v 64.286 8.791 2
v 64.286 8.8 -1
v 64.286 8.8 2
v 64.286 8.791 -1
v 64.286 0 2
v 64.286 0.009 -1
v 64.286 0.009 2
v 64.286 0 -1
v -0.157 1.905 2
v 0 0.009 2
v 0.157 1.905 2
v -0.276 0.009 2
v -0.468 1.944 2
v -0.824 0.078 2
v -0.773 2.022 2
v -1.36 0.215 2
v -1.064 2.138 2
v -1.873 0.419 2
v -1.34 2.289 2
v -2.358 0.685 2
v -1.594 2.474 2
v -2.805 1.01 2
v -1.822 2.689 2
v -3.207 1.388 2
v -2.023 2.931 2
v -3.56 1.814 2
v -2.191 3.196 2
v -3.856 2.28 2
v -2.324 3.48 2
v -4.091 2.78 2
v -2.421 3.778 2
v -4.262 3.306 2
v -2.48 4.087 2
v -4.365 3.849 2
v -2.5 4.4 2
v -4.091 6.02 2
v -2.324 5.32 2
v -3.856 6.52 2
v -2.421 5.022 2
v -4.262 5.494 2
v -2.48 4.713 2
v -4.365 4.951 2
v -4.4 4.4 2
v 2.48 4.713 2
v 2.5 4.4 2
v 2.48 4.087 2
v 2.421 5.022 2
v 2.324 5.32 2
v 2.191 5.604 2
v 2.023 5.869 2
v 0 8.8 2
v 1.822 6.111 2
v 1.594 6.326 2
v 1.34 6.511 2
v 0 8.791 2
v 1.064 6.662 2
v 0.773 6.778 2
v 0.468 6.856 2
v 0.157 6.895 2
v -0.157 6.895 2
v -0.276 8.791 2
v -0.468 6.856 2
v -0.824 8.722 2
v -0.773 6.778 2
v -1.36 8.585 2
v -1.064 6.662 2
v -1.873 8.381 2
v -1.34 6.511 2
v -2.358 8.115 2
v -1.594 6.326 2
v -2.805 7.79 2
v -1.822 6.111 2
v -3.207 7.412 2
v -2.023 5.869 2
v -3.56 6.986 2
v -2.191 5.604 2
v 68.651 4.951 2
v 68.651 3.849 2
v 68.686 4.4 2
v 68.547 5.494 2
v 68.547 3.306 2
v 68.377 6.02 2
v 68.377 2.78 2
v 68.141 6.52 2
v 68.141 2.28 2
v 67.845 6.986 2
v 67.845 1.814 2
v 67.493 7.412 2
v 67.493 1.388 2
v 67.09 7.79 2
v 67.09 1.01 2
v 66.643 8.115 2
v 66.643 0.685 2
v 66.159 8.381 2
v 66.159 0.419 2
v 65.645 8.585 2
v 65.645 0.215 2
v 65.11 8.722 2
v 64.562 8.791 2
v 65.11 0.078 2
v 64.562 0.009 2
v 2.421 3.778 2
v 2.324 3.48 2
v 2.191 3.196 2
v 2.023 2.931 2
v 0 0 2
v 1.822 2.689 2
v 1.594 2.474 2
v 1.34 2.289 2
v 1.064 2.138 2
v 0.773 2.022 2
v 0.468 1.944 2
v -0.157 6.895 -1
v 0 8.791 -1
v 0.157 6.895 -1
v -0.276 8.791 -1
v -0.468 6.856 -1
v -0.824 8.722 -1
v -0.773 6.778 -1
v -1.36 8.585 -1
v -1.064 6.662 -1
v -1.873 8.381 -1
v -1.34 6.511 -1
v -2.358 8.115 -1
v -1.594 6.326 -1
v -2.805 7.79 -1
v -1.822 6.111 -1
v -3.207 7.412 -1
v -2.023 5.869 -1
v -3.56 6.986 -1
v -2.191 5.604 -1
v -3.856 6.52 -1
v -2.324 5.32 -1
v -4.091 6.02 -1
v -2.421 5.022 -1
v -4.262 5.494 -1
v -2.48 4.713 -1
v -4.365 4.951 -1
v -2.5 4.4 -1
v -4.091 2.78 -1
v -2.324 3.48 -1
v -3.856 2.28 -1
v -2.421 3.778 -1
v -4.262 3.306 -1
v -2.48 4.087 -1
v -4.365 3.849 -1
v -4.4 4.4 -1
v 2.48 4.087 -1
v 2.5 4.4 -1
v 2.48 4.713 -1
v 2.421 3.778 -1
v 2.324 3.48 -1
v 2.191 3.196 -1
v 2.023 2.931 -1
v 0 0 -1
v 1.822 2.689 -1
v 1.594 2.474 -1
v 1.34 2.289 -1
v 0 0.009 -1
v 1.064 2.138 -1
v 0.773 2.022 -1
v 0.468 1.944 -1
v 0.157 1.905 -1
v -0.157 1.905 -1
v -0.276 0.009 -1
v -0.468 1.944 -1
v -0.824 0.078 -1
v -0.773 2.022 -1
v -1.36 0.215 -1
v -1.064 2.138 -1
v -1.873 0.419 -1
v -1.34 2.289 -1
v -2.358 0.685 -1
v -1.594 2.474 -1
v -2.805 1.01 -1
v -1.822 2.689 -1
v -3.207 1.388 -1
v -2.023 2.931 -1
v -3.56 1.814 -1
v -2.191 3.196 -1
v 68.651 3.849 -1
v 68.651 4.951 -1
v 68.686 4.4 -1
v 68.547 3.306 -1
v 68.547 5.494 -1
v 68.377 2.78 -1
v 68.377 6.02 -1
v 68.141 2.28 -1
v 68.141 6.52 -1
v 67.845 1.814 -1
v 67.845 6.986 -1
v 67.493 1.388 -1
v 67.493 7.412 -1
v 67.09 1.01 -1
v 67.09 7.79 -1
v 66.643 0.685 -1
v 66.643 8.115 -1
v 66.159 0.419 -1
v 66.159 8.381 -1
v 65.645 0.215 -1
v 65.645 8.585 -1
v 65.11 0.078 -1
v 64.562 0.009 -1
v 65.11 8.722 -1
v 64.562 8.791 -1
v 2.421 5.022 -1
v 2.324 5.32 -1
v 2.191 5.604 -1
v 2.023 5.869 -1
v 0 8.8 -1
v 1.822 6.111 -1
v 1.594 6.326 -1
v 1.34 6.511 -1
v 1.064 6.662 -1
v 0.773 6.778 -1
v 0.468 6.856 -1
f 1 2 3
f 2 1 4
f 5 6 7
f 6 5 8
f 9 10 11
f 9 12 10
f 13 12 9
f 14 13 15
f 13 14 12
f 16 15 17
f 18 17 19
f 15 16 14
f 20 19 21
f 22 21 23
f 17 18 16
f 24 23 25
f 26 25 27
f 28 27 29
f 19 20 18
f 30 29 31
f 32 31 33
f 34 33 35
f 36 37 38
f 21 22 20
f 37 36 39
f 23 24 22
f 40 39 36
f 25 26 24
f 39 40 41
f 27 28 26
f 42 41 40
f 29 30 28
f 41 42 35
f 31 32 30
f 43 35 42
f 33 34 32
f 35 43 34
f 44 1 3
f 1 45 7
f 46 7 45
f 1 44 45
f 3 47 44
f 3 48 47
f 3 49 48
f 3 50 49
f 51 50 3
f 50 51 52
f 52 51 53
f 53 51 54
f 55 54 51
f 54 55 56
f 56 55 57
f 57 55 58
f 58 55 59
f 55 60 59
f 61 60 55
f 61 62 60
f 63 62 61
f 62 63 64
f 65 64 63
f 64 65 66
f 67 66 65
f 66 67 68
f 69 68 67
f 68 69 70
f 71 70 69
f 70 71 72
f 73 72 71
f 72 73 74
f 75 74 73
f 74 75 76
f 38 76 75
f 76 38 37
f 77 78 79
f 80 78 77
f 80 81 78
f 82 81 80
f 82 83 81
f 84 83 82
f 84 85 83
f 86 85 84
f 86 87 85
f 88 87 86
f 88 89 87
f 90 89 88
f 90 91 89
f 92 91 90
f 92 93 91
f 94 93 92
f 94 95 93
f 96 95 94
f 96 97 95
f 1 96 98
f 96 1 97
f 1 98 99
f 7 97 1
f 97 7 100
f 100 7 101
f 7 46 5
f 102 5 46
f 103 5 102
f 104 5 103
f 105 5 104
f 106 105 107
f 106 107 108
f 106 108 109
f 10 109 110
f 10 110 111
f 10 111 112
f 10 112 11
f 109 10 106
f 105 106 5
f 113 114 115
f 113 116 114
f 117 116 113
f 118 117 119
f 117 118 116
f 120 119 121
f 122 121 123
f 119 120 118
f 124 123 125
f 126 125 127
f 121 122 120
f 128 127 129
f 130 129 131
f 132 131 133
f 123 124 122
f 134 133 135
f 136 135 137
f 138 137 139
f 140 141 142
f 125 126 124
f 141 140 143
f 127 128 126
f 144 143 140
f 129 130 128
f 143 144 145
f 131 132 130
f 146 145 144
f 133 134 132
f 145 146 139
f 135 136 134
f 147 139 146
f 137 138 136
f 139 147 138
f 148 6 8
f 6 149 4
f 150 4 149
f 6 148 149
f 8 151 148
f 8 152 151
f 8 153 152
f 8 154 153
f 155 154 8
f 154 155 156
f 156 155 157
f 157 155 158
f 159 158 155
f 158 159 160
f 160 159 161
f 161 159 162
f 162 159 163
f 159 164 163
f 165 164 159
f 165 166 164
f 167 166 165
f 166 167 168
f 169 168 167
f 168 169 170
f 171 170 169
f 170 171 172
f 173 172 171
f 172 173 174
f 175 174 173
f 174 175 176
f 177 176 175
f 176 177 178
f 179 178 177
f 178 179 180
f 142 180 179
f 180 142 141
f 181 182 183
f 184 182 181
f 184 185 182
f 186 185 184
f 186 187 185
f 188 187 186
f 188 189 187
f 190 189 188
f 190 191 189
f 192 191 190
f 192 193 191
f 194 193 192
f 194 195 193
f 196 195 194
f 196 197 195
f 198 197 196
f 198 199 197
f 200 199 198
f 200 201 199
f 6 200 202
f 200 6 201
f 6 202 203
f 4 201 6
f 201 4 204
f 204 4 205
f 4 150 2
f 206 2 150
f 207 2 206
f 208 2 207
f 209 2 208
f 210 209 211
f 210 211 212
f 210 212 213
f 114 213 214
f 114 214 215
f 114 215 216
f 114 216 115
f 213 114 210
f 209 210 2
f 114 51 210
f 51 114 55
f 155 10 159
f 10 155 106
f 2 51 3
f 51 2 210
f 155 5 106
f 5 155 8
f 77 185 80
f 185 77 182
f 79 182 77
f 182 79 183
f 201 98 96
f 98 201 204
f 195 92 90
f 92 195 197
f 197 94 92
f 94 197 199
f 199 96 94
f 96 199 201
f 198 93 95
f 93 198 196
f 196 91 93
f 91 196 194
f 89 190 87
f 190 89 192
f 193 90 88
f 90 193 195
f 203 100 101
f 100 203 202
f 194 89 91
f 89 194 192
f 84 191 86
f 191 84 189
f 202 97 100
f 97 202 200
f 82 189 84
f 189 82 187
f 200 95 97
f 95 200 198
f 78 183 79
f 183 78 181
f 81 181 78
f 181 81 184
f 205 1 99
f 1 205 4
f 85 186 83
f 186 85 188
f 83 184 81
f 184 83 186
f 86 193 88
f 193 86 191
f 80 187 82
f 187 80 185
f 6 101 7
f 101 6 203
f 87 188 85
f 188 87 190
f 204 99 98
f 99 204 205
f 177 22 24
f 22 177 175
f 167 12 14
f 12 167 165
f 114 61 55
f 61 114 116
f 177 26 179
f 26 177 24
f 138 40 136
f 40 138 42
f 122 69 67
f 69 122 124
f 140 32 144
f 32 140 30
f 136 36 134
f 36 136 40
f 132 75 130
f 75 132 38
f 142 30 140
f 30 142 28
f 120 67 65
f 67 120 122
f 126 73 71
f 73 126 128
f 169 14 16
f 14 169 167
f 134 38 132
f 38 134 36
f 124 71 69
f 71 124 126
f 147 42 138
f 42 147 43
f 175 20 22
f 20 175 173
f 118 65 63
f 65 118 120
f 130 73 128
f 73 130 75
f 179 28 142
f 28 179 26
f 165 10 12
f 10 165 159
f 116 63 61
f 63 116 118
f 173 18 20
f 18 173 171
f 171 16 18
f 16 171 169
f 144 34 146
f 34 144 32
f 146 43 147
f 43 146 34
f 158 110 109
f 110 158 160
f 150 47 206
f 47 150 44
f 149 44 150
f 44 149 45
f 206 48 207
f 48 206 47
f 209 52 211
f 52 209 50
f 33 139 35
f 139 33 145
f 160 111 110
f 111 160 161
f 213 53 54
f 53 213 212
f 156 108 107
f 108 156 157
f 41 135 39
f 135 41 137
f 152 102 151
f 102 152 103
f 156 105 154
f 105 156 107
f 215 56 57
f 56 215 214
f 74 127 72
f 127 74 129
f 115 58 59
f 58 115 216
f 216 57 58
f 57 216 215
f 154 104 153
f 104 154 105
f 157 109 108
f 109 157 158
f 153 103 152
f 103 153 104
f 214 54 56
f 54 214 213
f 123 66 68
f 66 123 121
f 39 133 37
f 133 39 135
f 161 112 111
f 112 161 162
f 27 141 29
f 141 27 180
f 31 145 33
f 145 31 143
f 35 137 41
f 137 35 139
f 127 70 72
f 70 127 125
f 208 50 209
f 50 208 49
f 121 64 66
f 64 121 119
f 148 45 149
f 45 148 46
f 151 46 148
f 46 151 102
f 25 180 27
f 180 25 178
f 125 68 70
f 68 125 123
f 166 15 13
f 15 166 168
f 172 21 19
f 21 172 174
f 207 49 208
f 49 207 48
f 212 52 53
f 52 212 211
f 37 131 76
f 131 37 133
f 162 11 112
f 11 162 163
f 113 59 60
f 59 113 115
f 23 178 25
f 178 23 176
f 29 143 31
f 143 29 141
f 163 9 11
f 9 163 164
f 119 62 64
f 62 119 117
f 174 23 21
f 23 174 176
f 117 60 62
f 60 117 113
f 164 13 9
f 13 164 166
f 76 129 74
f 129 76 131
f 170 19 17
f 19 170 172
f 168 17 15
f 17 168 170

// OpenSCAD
// file: vartimelabEL.scad
messageT="XiaoShiZi";
font_sizeT=10;
FontT = "knewave.dxf";
Posit= -1.5;
PositX= 3.0;
rotT= 6.6;
messageM="timelab";
font_sizeM=10;
FontM = "knewave.dxf";
Posim= 0.0;
PosimX= 3.0;
rotM= -6.6;
messageB="timelab.org";
font_sizeB=5;
FontB= "orbitron.dxf";
Posib= 2.2;
PosibX= 1.5;
rotB= 0.0;
// main file
//# -*- coding: iso-8859-15 -*-
	//Message Keychain
//http://www.thingiverse.com/thing:52734
//By allenZ
//v2 allow adjustment by user to avoid unconnected parts

//Changed by Xiao Shi Zi/Wim/Lionel Timelab Gent.
//15/02/2014
//V0.01
//Added 3 layers of text
//Top layer		: Name about 4 mm high
//Midden layer	: Brand, about 3mm high
//Bottom layer	: Website, this will be cutout in the keychains bottom

include <Write.scad>
//Text,Font,size added into the Write.scad file to ease the making of a key by a script.
//messageT=Top text
//messageM=Middle text
//messageB=Bottom Text
//messageTF=Top text font (See explenation how to add fonts in http://www.thingiverse.com/thing:16193) 
//messageMF=Middle text font 
//messageBF=Bottom text font
//messageTFS=MessageTopFontize.
//messageMFS=MessageMiddleFontSize
//messageBFS=MessageBottomFontSize
//PosiT=Position of TopText adjustment
//PosiM=Position of MiddleText adjustment
//PosiB=Position of BottomText adjustment.

//messageT=Top text
//messageM=Middle text
//messageB=Bottom Text
//messageTF FontT=Top text font (See explenation how to add fonts in thingiverse:51251) 
//messageMF FontM=Middle text font
//messageBF FontB=Bottom text font
//messageTFS font_sizeT=MessageTopFontize.
//messageMFS font_sizeM=MessageMiddleFontSize
//messageBFS font_sizeB=MessageBottomFontSize
//Posit=Position of TopText adjustment
//Posim=Position of MiddleText adjustment
//Posib=Position of BottomText adjustment.

//messageT
//messageT = "Wim";
//messageT="Lionel";

//messageM= "e o s";
//To be changed to messageM
//possible to add a space inbetween the letters cause the space is layer defined in the dxf-font ;-)
//only (space)&(eos)" eos" are defined in the eos.dxf font!
//messageB="Timelab.org";
//To be changed to MessageB
//echo "message";

include <vartimelabEL.scad>
//messageT="Gçon";
//messageM="ç";
//messageB="timelab.org";
//Posit=-1.5; Y-Ax move
//Posim=-2.1;
//Posib=2.2;
//PositX=3;	X-Ax move
//PosimX=3;
//PosibX=-1.5;
//rotT=3;
//rotM=-4;
//rotB=1;

//echo (messageM);
//echo ("topL=",(font_sizeT*len(messageT)/1.4));
//echo ("MiddelL=",(font_sizeM*len(messageM)/1.4));
//echo ("BottomL=",(font_sizeB*len(messageB)/1.4));
//echo ("max=",max((font_sizeT*len(messageT)/1.4),(font_sizeM*len(messageM)/1.4),(font_sizeB*len(messageB)/1.4)));
TotalLenght=max((font_sizeT*len(messageT)/1.4),(font_sizeM*len(messageM)/1.4),(font_sizeB*len(messageB)/1.4));

//Add the posi to the length!

///echo ("Total",TotalLenght);
//FontT= "letters.dxf";
//include <varTMB.scad>
//To be changed in keyMakerTMB.py				DONE
//To be added Top Middle Bottom text to varTMB.scad		DONE
//To be added Posi Top Middel Bottom	
//To be added Font Top Middle Bottom
//To be added Fontsize Top Middel Bottom
//To be added Footstand Y/N

//Font = "braille.dxf";//["Letters.dxf":Basic,"orbitron.dxf":Futuristic,"braille.dxf":Braille,"BlackRose.dxf":Black]
//FontM="eos.dxf";
//FontB="orbitron.dxf";
//font_sizeT=10;
//font_sizeM=10;
//font_sizeB = 5;

font_thicknessT = 5;
font_thicknessM = 4;
font_thicknessB = 0.5;

stick_thickness = 3;
stick_width = 8.8;

hole_radius = 2.5;
Lengte = 1;

flat_bottom = 1; //[1:Yes,2:No]

union () {

if (flat_bottom == 1) translate ([0,0,-font_thicknessT/2+stick_thickness/2]) flatstickwithhole();

if (flat_bottom == 2) flatstickwithhole();

}

module flatstickwithhole() {

difference () {

union () {
//Middle 
//translate ([3,-2.1,0])
//text(t = "Text!", $fn = 20, size = 10, font = "ArialMT");
translate ([PosimX,Posim,0])
rotate([0,0,rotM])
color("green")write(messageM,t=font_thicknessM, h=font_sizeM, center = false, font = FontM);
//Top
//translate ([3,Posit,0])
translate ([PositX,Posit,0])
rotate([0,0,rotT])
color("red")write(messageT,t=font_thicknessT, h=font_sizeT, center = false, font = FontT);

translate ([0,0,0]) cube ([TotalLenght, stick_width, stick_thickness],center=false);//font_size*len(message)/1.4

translate ([TotalLenght,stick_width/2,0])cylinder (r=stick_width/2,h=stick_thickness,center=false,$fn=50);//font_size*len(message)/1.3+2

translate ([0,stick_width/2,0])cylinder (r=stick_width/2,h=stick_thickness,center=false,$fn=50);
}

translate ([0,stick_width/2,-1])cylinder (r=hole_radius,h=stick_thickness+2,center=false,$fn=50);

//Add timelab.org at bottom 
mirror([1,0,0]) translate ([-TotalLenght-1.5,2.2,-0.1]) rotate([0,0,rotB])
write(messageB,t=font_thicknessB, h=font_sizeB, center = false, font = FontB);
}}
